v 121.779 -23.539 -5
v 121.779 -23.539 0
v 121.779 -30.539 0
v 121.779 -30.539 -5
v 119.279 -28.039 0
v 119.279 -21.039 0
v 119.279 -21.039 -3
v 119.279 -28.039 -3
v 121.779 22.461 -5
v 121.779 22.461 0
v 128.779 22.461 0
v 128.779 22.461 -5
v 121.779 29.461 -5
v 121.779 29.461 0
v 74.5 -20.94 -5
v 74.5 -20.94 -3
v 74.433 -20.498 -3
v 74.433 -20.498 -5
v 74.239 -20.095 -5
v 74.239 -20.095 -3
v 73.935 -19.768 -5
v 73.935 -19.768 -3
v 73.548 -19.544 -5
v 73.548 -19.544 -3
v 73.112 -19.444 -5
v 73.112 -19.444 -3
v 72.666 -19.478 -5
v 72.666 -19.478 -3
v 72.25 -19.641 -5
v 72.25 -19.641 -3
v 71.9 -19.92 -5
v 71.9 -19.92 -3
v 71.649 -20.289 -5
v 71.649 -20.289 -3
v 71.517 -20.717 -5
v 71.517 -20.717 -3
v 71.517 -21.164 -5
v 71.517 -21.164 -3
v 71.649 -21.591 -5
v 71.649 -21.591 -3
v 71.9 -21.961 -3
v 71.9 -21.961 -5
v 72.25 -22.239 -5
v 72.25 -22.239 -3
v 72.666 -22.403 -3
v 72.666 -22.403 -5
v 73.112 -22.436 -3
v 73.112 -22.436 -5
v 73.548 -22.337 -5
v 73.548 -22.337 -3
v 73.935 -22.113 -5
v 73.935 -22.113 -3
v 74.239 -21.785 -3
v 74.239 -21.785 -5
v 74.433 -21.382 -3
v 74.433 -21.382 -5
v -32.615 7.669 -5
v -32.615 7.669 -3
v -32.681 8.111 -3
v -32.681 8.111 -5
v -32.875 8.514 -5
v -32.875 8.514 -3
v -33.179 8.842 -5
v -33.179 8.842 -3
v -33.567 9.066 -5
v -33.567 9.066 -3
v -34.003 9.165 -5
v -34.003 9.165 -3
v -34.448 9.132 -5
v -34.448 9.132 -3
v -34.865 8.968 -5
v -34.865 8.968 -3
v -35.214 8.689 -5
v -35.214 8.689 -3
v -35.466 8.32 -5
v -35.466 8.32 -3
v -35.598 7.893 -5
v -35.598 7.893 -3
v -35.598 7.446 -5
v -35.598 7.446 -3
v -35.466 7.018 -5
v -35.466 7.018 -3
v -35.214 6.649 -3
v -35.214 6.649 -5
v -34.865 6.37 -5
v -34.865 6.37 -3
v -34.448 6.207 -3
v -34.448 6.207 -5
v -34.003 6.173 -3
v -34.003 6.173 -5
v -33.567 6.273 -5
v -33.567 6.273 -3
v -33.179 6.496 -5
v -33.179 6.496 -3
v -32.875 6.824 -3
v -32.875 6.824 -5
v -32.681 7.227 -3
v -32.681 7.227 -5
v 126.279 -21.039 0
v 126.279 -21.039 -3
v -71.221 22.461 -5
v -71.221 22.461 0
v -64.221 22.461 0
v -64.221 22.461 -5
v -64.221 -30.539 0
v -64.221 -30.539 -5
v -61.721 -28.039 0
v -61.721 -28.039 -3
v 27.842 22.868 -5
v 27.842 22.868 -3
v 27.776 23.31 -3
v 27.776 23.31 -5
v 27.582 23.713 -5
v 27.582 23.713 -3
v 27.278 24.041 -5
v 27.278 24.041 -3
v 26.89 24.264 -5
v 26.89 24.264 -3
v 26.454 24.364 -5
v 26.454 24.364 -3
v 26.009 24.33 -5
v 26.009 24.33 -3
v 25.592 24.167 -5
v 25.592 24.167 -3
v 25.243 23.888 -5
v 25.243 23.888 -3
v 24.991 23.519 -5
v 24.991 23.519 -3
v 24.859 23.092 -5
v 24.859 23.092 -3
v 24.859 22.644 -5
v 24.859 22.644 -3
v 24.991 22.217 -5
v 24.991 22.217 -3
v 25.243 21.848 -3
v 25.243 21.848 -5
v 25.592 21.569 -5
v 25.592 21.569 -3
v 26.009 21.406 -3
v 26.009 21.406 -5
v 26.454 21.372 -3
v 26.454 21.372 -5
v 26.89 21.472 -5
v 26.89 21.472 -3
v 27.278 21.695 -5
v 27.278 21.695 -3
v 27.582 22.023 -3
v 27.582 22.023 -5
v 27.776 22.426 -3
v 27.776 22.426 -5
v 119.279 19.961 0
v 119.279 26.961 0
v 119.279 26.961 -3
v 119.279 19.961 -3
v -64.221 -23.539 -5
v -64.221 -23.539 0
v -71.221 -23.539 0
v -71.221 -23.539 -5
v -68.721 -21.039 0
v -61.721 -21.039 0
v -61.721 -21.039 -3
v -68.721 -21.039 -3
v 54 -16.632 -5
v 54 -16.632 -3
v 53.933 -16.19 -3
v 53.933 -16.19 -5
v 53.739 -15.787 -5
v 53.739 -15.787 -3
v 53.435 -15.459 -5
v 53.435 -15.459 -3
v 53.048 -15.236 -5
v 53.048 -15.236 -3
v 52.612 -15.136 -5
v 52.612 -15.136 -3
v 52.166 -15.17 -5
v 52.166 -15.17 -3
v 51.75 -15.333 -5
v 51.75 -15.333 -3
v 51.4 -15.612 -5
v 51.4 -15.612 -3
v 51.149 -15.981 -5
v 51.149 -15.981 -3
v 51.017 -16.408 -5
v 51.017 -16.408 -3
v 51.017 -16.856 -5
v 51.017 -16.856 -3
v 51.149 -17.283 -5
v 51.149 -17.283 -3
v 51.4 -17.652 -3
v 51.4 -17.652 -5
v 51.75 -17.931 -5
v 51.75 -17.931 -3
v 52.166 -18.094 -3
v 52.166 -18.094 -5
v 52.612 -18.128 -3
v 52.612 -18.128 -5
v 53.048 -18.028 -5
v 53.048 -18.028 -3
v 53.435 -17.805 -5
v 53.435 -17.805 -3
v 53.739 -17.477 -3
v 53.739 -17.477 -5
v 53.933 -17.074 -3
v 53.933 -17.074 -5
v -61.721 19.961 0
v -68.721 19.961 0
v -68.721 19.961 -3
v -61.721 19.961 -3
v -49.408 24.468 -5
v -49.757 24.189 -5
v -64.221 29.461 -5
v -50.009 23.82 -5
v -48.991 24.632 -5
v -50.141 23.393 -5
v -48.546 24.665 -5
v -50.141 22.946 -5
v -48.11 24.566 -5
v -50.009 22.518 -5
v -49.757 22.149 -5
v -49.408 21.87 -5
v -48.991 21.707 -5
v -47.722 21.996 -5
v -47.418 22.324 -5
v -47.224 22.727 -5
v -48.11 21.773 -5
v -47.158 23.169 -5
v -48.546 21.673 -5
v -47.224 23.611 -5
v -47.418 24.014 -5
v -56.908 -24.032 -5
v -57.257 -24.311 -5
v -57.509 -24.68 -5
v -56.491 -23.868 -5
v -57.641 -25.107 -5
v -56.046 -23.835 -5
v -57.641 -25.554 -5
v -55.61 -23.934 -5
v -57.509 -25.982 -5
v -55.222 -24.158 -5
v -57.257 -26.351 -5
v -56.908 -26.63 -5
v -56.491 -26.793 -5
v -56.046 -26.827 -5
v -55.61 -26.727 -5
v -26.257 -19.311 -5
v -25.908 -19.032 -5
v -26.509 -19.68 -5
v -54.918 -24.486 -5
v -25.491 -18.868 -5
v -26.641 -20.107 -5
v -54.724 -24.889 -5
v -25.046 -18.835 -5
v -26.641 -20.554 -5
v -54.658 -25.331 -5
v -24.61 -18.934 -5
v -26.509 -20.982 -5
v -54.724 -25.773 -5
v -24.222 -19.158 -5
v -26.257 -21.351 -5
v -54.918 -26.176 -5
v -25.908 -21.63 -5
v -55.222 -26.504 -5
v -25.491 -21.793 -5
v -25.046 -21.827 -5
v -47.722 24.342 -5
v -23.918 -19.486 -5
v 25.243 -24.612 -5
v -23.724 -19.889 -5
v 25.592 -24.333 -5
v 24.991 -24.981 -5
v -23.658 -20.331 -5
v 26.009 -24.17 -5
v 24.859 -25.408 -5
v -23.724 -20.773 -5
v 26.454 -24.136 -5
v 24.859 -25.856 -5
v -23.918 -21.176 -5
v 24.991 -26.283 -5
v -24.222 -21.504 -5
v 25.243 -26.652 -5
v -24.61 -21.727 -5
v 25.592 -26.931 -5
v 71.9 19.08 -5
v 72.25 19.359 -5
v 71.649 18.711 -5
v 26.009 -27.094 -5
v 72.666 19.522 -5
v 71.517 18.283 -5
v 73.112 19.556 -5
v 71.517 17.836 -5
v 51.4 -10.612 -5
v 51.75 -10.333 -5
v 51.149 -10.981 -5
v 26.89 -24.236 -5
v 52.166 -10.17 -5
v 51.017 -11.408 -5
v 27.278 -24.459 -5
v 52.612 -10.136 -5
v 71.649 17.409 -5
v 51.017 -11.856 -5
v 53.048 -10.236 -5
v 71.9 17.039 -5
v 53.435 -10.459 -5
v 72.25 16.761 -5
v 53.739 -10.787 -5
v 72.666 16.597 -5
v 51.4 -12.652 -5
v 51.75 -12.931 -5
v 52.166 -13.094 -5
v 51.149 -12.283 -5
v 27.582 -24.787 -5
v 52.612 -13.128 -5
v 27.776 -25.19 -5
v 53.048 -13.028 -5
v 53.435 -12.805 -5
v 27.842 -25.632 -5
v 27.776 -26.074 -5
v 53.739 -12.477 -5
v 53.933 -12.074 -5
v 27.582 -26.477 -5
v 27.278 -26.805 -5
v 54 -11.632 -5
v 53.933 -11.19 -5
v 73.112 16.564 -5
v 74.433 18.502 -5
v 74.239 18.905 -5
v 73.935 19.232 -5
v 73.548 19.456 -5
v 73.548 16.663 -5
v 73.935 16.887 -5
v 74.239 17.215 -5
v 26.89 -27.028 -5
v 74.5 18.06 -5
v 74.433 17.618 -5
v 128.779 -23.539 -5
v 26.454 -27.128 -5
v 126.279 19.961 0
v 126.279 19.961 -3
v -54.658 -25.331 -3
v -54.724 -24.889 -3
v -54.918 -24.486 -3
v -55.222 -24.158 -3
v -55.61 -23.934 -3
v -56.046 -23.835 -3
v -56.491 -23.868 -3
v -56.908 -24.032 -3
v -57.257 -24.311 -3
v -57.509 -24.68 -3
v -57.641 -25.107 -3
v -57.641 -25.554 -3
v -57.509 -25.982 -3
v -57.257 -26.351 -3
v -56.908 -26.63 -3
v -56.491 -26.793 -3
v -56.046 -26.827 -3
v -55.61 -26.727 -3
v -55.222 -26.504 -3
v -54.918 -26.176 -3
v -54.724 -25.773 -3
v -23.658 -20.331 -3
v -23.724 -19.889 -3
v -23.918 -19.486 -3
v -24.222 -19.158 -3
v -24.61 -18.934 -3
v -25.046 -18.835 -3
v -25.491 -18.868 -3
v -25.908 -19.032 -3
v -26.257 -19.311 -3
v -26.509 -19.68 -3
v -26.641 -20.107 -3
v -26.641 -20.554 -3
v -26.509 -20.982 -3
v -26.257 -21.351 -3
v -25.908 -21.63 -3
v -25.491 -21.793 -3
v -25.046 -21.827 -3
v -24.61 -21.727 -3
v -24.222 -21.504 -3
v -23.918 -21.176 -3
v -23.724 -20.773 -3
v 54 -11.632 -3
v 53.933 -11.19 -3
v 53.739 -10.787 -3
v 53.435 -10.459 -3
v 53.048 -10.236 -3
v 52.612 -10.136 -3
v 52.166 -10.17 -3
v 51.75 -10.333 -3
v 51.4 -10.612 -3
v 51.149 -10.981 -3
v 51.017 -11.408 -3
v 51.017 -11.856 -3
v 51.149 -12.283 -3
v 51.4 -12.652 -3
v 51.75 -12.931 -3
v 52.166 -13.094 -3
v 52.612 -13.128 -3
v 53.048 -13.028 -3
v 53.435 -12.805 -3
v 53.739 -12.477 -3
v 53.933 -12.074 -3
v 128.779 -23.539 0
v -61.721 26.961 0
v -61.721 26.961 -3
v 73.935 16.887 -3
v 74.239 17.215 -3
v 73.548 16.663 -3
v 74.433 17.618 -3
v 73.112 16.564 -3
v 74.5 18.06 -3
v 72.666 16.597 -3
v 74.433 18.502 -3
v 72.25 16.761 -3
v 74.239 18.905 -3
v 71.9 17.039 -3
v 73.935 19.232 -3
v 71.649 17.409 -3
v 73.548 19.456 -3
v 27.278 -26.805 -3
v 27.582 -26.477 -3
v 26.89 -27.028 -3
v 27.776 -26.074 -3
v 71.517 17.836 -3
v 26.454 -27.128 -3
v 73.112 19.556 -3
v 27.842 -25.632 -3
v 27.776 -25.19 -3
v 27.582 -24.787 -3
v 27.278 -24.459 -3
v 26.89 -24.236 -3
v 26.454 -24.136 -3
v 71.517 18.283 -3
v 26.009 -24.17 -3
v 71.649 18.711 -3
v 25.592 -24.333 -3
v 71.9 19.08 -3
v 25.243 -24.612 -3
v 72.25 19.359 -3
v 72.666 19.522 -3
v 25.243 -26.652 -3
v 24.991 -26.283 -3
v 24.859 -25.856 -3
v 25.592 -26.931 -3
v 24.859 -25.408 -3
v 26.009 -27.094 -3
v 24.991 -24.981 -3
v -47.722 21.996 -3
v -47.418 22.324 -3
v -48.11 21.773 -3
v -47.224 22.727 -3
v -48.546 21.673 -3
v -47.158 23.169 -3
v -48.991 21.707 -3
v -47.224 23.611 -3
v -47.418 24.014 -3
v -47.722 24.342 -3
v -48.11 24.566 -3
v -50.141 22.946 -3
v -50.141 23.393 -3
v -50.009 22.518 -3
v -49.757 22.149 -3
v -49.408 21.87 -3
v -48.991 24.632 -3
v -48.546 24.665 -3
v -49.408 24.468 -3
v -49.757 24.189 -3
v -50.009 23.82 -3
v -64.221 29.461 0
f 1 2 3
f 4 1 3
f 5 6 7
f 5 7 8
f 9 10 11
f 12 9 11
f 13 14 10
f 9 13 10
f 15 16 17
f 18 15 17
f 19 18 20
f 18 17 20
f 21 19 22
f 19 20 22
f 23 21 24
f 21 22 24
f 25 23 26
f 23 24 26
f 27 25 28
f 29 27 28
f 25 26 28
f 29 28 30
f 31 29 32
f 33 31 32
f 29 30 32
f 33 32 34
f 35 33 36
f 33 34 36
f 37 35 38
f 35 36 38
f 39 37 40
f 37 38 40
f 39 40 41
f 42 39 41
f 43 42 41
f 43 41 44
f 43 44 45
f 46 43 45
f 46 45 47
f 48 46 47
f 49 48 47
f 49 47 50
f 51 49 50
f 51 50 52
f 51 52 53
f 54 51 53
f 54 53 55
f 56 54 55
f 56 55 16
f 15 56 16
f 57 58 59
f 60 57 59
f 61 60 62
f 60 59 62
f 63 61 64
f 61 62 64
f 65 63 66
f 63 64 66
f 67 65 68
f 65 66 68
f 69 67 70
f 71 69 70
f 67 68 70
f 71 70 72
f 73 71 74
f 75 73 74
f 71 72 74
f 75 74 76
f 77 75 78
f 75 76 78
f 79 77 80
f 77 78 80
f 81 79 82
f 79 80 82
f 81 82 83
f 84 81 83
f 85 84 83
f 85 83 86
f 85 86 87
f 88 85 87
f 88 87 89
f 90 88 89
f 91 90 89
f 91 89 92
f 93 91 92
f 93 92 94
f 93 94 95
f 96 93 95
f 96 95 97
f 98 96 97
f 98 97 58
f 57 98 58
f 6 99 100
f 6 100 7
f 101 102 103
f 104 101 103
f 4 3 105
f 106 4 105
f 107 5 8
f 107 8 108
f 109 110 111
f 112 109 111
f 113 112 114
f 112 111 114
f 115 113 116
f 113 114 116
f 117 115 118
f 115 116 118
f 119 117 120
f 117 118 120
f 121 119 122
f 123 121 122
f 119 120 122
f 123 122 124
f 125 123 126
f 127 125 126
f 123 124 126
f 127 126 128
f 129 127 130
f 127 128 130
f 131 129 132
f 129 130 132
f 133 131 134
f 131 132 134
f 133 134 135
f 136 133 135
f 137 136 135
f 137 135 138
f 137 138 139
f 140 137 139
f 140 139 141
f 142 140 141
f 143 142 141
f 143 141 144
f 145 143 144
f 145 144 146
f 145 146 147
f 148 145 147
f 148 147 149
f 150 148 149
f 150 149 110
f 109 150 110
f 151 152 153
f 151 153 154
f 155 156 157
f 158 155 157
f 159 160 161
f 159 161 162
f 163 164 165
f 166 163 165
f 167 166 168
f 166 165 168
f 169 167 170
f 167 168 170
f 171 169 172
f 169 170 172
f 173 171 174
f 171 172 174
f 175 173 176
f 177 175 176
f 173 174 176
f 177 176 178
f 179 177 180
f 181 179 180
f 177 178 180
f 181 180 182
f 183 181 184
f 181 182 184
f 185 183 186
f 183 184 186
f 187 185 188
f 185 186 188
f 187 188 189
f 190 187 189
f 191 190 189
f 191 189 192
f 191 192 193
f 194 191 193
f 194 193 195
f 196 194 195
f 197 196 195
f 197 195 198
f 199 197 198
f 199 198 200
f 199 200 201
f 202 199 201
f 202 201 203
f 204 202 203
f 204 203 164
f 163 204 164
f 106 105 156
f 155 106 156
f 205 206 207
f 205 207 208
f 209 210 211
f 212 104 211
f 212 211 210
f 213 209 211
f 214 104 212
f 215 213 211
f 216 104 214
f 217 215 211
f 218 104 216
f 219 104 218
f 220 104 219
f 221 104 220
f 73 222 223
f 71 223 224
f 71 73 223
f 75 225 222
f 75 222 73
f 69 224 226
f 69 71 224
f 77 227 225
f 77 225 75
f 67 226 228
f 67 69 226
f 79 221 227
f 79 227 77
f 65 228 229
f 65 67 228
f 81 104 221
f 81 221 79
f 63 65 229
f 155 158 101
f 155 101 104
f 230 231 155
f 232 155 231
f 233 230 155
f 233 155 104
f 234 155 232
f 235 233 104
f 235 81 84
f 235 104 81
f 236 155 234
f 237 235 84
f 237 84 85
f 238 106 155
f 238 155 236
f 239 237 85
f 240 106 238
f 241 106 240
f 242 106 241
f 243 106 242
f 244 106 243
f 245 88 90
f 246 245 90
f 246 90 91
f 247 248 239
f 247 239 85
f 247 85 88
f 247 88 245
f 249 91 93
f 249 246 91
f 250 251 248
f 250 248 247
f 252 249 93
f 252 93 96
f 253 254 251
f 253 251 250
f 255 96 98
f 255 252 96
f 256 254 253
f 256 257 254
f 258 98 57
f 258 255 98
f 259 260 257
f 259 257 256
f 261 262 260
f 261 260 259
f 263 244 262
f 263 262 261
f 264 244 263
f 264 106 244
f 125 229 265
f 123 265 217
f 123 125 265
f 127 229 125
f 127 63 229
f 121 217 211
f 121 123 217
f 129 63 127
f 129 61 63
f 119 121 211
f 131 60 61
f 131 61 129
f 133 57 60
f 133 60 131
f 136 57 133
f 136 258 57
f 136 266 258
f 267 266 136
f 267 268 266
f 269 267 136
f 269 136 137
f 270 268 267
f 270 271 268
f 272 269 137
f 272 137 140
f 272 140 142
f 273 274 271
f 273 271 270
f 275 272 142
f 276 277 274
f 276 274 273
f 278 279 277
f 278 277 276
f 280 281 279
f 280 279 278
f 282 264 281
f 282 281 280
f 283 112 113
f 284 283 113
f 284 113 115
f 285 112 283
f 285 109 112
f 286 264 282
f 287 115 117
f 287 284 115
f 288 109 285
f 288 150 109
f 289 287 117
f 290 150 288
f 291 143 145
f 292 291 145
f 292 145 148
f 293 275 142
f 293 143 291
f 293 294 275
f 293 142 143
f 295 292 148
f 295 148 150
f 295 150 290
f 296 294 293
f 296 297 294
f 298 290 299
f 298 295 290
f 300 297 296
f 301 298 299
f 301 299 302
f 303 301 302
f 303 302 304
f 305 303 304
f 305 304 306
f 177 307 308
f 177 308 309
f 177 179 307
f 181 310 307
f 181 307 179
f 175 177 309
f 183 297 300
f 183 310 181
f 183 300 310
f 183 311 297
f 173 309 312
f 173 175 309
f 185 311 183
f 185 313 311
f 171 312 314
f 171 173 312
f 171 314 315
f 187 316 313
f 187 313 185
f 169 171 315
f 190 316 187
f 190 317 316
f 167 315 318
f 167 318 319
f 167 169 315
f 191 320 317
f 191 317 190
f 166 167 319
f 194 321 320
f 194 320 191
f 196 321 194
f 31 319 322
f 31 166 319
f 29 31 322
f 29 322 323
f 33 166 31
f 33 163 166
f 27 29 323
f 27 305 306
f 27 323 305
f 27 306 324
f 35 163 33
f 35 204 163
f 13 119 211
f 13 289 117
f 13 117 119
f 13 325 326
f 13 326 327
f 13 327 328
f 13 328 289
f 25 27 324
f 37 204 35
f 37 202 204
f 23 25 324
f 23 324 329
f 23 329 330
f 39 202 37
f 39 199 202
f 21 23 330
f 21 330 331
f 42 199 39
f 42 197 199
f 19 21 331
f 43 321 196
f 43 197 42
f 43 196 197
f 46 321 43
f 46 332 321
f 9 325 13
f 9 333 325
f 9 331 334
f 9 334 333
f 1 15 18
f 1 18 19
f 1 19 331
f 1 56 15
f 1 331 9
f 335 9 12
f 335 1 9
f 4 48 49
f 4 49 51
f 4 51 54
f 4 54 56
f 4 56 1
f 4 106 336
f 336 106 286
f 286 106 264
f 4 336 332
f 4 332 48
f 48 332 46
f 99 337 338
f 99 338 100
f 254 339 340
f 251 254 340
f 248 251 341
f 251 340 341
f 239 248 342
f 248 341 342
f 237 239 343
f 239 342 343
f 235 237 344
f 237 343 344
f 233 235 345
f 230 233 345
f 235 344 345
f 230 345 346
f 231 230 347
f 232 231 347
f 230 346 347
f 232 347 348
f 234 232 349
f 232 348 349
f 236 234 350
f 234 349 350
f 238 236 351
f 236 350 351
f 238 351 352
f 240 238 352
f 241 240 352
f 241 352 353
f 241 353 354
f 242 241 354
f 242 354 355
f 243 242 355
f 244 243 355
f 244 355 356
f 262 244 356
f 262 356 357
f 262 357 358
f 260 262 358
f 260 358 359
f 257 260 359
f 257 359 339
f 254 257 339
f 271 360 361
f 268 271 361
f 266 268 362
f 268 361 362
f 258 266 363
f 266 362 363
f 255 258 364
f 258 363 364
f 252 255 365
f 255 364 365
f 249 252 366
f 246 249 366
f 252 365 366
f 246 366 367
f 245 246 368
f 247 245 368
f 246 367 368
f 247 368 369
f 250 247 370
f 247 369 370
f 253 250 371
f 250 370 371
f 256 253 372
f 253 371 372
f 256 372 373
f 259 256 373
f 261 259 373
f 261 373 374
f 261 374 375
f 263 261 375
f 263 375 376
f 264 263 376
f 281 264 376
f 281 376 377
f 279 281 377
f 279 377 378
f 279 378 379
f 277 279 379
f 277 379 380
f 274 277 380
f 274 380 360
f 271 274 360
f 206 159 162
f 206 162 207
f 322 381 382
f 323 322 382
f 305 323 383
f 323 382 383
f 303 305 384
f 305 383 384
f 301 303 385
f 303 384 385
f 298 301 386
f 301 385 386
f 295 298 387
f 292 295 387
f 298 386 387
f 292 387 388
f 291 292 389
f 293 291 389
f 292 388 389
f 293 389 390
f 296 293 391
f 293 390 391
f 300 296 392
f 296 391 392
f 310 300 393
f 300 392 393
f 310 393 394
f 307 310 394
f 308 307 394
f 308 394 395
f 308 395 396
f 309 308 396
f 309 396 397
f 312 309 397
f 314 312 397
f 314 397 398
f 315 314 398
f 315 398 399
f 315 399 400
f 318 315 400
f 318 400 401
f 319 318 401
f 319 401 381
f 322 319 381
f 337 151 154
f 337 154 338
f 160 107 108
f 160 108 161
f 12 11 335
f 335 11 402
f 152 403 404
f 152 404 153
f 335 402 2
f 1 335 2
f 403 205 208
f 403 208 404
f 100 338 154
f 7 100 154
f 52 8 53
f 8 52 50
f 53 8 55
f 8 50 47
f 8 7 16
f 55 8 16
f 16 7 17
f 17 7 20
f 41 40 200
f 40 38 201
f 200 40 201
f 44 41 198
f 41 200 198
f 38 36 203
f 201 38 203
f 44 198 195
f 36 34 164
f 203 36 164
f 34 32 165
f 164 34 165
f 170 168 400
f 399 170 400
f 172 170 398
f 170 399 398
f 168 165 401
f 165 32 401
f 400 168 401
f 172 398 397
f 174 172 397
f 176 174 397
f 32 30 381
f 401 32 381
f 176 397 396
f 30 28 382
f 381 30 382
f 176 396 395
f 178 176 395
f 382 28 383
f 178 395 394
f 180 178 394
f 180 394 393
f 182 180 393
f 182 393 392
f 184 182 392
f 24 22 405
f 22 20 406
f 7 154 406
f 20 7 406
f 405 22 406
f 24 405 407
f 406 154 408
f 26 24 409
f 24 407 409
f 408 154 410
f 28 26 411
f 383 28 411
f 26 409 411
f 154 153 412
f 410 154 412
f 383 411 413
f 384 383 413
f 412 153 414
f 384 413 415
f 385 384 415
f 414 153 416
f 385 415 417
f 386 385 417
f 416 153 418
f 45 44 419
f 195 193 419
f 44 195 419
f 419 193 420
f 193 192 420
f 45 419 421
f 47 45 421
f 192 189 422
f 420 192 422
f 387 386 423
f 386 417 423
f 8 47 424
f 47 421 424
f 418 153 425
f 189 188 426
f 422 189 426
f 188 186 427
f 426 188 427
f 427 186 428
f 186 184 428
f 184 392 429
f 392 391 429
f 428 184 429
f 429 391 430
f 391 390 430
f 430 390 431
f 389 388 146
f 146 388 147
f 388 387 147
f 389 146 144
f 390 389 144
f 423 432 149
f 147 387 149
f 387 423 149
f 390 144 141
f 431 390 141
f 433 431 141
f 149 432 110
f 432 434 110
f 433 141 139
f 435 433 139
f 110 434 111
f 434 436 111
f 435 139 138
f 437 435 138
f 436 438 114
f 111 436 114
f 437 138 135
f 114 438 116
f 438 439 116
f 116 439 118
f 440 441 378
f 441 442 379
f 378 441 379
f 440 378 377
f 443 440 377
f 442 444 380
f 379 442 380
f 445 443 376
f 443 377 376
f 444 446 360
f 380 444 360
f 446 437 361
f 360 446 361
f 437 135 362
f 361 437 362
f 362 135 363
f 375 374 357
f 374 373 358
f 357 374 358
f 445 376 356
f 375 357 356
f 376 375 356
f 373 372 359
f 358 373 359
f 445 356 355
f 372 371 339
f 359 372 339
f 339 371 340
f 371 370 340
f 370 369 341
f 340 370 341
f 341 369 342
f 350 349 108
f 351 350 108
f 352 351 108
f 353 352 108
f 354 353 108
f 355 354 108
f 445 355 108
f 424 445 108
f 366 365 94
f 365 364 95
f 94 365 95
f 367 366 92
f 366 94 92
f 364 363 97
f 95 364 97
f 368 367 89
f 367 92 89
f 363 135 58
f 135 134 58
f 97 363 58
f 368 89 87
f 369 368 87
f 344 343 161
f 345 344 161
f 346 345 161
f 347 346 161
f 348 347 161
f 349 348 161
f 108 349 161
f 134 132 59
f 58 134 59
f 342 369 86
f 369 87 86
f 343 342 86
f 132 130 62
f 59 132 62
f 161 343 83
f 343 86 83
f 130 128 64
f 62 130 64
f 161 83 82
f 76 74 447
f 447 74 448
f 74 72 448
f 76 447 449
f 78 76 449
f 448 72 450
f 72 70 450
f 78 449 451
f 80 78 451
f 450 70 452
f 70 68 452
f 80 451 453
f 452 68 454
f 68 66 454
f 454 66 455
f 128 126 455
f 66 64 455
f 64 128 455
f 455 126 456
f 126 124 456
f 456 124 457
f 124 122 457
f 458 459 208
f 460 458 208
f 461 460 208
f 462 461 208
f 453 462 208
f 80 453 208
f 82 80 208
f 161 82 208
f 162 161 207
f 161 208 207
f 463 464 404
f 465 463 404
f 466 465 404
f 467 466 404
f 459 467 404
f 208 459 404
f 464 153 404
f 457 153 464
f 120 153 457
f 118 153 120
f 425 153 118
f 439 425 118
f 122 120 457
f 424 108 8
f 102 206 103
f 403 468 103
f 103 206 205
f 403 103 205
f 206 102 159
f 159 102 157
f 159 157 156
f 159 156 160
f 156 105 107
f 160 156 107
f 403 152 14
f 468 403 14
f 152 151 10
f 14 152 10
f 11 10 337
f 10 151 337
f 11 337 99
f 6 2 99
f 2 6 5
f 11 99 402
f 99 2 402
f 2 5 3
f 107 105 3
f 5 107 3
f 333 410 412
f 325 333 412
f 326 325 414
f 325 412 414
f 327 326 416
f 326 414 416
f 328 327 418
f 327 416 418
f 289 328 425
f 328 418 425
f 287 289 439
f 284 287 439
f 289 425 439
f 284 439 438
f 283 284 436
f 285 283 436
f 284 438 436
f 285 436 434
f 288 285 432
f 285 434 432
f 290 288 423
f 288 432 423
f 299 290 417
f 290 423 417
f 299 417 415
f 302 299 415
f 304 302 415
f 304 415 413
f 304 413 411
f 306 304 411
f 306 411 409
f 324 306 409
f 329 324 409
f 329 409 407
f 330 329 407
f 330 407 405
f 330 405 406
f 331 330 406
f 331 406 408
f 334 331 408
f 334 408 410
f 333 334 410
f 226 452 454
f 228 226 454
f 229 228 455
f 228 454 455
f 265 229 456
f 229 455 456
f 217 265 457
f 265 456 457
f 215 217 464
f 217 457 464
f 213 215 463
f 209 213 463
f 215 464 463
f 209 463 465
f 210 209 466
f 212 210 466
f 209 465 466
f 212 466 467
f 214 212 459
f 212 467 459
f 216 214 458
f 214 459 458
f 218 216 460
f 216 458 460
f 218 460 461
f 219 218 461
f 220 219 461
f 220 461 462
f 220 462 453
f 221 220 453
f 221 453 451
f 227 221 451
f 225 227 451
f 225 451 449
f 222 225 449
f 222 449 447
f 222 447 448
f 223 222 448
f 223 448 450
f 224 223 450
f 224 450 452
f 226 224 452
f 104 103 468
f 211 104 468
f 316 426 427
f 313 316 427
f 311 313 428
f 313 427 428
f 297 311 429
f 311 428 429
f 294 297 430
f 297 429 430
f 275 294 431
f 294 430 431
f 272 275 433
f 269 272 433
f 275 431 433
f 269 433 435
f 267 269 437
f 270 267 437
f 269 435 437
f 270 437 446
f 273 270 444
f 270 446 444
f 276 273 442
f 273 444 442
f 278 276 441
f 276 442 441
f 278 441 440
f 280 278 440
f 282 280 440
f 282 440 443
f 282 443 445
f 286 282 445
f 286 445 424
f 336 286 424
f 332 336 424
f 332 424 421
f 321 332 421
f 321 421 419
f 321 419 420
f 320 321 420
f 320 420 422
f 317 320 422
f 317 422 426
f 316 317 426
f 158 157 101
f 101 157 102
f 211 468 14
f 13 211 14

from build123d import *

# Parameters (mm, degrees)
PAD_DEPTH       = 5
POCKET003_DEPTH = 3
SKETCH011_R     = 1.5
POCKET004_DEPTH = 10


with BuildPart() as part:
    # Sketch009 (on Face5 of Pad002) → Pad (new body)
    with BuildSketch(Plane(origin=(0, 0, 0), x_dir=(1, 0, 0), z_dir=(0, 0, -1))):
        Polygon((-64.221279, 23.538714), (-71.221279, 23.538714), (-71.221279, -22.461286), (-64.221279, -22.461286), (-64.221279, -29.461286), (121.778721, -29.461286), (121.778721, -22.461286), (128.778721, -22.461286), (128.778721, 23.538714), (121.778721, 23.538714), (121.778721, 30.538714), (-64.221279, 30.538714), align=None)
    extrude(amount=PAD_DEPTH)

    # Sketch010 (on Face13 of Pad) → Pocket003 (cut)
    with BuildSketch(Plane.XY):
        Polygon((-61.721279, -28.038714), (-61.721279, -21.038714), (-68.721279, -21.038714), (-68.721279, 19.961286), (-61.721279, 19.961286), (-61.721279, 26.961286), (119.278721, 26.961286), (119.278721, 19.961286), (126.278721, 19.961286), (126.278721, -21.038714), (119.278721, -21.038714), (119.278721, -28.038714), align=None)
    extrude(amount=-POCKET003_DEPTH, mode=Mode.SUBTRACT)

    # Sketch011 (on Face27 of Pocket003) → Pocket004 (cut)
    with BuildSketch(Plane.XY.offset(-3)):
        with Locations((-48.657681, 23.169219)):
            Circle(SKETCH011_R)
        with Locations((-34.114651, 7.669219)):
            Circle(SKETCH011_R)
        with Locations((26.342319, 22.86806)):
            Circle(SKETCH011_R)
        with Locations((-25.157681, -20.330781)):
            Circle(SKETCH011_R)
        with Locations((-56.157681, -25.330781)):
            Circle(SKETCH011_R)
        with Locations((26.342319, -25.63194)):
            Circle(SKETCH011_R)
        with Locations((52.5, -11.63194)):
            Circle(SKETCH011_R)
        with Locations((52.5, -16.63194)):
            Circle(SKETCH011_R)
        with Locations((73, 18.059744)):
            Circle(SKETCH011_R)
        with Locations((73, -20.940256)):
            Circle(SKETCH011_R)
    extrude(amount=-POCKET004_DEPTH, mode=Mode.SUBTRACT)


solid = part.part
